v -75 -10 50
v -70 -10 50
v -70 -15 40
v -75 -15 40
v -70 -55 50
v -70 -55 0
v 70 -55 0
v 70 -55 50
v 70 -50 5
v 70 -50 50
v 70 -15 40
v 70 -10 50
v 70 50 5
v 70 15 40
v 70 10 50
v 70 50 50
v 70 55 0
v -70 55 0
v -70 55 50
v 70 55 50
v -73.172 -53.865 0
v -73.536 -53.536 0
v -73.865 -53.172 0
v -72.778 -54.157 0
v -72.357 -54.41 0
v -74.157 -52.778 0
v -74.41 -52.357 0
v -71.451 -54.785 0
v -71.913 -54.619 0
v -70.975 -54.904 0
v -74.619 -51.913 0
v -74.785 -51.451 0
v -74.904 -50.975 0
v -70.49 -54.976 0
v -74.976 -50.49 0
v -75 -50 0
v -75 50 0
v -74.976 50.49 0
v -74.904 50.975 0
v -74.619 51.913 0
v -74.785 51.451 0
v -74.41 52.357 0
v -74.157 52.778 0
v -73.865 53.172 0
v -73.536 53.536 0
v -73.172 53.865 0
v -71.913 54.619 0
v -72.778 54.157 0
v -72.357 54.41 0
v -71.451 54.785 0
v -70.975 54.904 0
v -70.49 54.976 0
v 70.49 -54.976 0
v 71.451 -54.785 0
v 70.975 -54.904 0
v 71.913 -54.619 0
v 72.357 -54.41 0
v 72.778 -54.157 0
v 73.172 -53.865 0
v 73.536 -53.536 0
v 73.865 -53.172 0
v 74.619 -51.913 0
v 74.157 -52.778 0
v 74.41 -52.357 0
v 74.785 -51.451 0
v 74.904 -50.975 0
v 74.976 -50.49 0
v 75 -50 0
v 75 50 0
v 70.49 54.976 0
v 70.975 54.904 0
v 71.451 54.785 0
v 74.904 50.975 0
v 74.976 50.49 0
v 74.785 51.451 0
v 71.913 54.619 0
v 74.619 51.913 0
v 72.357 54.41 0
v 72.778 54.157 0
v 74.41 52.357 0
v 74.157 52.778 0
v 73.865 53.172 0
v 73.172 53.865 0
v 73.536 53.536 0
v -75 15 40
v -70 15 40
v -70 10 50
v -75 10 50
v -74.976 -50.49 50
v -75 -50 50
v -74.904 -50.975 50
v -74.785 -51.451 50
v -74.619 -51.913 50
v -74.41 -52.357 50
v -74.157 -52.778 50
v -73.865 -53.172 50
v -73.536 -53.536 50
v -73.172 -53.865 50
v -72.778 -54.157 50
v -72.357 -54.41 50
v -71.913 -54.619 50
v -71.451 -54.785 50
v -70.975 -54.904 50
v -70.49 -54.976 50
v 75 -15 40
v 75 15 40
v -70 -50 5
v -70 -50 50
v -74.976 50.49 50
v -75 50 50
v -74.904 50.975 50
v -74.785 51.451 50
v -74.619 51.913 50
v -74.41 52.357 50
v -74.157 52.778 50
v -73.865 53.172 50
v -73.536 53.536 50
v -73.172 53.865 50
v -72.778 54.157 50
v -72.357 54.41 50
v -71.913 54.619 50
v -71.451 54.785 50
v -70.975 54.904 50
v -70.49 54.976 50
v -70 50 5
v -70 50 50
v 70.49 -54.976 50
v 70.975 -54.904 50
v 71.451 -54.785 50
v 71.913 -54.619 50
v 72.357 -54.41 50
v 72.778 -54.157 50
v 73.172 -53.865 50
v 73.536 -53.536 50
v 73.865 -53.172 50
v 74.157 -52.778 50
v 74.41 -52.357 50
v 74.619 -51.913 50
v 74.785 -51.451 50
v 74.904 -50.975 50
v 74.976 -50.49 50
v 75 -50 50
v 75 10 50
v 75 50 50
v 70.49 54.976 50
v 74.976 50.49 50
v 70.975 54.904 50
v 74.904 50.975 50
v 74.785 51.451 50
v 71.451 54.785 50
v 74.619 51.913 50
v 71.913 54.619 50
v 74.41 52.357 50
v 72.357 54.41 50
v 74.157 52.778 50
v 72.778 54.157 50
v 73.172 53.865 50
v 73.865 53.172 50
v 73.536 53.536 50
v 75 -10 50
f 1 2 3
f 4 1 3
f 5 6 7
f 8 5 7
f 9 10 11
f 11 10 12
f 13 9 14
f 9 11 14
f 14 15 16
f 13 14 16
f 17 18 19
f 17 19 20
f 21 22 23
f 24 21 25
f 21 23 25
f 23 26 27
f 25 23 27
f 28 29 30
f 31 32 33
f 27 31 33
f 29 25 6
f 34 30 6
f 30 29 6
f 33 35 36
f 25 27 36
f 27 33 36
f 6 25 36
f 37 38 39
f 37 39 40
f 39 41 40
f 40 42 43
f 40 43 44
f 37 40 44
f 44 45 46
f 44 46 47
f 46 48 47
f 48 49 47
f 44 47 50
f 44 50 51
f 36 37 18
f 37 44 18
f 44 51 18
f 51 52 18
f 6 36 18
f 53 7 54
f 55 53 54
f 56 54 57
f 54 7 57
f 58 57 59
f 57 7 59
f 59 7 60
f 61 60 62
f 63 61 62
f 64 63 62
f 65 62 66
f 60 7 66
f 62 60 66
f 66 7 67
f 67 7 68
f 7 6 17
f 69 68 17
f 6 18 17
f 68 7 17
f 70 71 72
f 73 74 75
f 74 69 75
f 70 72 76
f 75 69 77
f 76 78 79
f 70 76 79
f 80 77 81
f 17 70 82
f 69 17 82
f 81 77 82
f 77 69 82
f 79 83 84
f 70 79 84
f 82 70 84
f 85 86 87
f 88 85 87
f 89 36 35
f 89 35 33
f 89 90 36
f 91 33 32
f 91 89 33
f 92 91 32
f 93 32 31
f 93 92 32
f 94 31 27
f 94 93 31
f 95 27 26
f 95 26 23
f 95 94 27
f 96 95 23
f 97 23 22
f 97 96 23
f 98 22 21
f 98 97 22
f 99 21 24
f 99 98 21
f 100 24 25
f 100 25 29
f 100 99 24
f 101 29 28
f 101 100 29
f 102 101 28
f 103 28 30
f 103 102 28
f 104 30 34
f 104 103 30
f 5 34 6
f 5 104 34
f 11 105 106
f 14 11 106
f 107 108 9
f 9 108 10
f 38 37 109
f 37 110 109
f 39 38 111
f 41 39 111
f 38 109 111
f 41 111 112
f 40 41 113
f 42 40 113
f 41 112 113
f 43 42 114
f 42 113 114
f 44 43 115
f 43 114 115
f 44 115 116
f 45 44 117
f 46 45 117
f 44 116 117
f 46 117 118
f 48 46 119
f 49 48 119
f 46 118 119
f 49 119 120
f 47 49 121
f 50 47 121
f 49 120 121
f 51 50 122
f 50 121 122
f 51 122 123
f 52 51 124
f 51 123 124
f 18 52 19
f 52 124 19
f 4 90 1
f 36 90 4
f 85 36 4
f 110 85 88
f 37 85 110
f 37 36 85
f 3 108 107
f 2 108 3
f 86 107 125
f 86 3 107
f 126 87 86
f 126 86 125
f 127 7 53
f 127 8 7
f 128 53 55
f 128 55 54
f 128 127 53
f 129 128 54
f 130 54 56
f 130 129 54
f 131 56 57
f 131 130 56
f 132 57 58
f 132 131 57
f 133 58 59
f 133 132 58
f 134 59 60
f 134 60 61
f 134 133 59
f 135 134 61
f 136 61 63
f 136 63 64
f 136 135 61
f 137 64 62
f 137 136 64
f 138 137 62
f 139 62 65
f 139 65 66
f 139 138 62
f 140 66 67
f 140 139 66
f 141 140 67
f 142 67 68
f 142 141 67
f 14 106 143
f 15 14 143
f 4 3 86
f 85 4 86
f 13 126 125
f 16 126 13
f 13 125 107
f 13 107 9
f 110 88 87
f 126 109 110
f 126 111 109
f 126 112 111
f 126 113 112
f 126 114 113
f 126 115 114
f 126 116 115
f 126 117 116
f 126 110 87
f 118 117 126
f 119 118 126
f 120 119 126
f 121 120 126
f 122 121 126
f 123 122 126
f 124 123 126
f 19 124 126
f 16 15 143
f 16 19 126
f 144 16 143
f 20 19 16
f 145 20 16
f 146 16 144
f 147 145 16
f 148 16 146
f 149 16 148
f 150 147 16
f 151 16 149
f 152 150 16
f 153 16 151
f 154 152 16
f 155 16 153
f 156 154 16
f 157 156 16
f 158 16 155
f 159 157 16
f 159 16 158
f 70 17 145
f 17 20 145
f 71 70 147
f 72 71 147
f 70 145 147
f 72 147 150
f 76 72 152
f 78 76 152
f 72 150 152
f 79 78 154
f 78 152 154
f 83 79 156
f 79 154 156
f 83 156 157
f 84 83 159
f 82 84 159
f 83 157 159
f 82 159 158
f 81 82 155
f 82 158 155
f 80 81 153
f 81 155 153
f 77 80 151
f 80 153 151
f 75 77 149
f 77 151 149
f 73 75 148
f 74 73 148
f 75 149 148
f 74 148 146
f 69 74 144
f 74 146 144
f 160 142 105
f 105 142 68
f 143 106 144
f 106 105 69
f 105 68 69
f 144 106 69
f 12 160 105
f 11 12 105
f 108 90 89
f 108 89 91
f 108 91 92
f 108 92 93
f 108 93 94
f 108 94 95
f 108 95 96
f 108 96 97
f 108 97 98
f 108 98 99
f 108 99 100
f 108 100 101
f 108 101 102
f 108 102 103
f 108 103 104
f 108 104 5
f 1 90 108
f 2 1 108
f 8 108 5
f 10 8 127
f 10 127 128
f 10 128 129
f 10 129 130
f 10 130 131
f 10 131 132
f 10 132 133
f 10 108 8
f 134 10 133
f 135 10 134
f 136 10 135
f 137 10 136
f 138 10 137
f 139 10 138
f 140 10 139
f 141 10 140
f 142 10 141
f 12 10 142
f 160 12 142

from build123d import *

# Parameters (mm, degrees)
F0_W     = 150
F0_H     = 110
F1_DEPTH = 50
F2_W     = 140
F2_H     = 100
F3_DEPTH = 45
F4_R     = 5
F6_DEPTH = 160


with BuildPart() as f1:
    # F0 (on Top) → F1 (new body)
    with BuildSketch(Plane.XY):
        Rectangle(F0_W, F0_H)
    extrude(amount=F1_DEPTH)

    # F2 (on face) → F3 (cut)
    with BuildSketch(Plane.XY.offset(50)):
        Rectangle(F2_W, F2_H)
    extrude(amount=-F3_DEPTH, mode=Mode.SUBTRACT)

    # F4
    f4_edges = [f1.edges().sort_by_distance(p)[0] for p in [
        (75, -55, 25),
        (75, 55, 25),
        (-75, 55, 25),
        (-75, -55, 25),
    ]]
    fillet(f4_edges, radius=F4_R)

    # F5 (on face) → F6 (cut)
    with BuildSketch(Plane.YZ.offset(75)):
        Polygon((10, 50), (-10, 50), (-15, 40), (15, 40), align=None)
    extrude(amount=-F6_DEPTH, mode=Mode.SUBTRACT)


solid = f1.part
